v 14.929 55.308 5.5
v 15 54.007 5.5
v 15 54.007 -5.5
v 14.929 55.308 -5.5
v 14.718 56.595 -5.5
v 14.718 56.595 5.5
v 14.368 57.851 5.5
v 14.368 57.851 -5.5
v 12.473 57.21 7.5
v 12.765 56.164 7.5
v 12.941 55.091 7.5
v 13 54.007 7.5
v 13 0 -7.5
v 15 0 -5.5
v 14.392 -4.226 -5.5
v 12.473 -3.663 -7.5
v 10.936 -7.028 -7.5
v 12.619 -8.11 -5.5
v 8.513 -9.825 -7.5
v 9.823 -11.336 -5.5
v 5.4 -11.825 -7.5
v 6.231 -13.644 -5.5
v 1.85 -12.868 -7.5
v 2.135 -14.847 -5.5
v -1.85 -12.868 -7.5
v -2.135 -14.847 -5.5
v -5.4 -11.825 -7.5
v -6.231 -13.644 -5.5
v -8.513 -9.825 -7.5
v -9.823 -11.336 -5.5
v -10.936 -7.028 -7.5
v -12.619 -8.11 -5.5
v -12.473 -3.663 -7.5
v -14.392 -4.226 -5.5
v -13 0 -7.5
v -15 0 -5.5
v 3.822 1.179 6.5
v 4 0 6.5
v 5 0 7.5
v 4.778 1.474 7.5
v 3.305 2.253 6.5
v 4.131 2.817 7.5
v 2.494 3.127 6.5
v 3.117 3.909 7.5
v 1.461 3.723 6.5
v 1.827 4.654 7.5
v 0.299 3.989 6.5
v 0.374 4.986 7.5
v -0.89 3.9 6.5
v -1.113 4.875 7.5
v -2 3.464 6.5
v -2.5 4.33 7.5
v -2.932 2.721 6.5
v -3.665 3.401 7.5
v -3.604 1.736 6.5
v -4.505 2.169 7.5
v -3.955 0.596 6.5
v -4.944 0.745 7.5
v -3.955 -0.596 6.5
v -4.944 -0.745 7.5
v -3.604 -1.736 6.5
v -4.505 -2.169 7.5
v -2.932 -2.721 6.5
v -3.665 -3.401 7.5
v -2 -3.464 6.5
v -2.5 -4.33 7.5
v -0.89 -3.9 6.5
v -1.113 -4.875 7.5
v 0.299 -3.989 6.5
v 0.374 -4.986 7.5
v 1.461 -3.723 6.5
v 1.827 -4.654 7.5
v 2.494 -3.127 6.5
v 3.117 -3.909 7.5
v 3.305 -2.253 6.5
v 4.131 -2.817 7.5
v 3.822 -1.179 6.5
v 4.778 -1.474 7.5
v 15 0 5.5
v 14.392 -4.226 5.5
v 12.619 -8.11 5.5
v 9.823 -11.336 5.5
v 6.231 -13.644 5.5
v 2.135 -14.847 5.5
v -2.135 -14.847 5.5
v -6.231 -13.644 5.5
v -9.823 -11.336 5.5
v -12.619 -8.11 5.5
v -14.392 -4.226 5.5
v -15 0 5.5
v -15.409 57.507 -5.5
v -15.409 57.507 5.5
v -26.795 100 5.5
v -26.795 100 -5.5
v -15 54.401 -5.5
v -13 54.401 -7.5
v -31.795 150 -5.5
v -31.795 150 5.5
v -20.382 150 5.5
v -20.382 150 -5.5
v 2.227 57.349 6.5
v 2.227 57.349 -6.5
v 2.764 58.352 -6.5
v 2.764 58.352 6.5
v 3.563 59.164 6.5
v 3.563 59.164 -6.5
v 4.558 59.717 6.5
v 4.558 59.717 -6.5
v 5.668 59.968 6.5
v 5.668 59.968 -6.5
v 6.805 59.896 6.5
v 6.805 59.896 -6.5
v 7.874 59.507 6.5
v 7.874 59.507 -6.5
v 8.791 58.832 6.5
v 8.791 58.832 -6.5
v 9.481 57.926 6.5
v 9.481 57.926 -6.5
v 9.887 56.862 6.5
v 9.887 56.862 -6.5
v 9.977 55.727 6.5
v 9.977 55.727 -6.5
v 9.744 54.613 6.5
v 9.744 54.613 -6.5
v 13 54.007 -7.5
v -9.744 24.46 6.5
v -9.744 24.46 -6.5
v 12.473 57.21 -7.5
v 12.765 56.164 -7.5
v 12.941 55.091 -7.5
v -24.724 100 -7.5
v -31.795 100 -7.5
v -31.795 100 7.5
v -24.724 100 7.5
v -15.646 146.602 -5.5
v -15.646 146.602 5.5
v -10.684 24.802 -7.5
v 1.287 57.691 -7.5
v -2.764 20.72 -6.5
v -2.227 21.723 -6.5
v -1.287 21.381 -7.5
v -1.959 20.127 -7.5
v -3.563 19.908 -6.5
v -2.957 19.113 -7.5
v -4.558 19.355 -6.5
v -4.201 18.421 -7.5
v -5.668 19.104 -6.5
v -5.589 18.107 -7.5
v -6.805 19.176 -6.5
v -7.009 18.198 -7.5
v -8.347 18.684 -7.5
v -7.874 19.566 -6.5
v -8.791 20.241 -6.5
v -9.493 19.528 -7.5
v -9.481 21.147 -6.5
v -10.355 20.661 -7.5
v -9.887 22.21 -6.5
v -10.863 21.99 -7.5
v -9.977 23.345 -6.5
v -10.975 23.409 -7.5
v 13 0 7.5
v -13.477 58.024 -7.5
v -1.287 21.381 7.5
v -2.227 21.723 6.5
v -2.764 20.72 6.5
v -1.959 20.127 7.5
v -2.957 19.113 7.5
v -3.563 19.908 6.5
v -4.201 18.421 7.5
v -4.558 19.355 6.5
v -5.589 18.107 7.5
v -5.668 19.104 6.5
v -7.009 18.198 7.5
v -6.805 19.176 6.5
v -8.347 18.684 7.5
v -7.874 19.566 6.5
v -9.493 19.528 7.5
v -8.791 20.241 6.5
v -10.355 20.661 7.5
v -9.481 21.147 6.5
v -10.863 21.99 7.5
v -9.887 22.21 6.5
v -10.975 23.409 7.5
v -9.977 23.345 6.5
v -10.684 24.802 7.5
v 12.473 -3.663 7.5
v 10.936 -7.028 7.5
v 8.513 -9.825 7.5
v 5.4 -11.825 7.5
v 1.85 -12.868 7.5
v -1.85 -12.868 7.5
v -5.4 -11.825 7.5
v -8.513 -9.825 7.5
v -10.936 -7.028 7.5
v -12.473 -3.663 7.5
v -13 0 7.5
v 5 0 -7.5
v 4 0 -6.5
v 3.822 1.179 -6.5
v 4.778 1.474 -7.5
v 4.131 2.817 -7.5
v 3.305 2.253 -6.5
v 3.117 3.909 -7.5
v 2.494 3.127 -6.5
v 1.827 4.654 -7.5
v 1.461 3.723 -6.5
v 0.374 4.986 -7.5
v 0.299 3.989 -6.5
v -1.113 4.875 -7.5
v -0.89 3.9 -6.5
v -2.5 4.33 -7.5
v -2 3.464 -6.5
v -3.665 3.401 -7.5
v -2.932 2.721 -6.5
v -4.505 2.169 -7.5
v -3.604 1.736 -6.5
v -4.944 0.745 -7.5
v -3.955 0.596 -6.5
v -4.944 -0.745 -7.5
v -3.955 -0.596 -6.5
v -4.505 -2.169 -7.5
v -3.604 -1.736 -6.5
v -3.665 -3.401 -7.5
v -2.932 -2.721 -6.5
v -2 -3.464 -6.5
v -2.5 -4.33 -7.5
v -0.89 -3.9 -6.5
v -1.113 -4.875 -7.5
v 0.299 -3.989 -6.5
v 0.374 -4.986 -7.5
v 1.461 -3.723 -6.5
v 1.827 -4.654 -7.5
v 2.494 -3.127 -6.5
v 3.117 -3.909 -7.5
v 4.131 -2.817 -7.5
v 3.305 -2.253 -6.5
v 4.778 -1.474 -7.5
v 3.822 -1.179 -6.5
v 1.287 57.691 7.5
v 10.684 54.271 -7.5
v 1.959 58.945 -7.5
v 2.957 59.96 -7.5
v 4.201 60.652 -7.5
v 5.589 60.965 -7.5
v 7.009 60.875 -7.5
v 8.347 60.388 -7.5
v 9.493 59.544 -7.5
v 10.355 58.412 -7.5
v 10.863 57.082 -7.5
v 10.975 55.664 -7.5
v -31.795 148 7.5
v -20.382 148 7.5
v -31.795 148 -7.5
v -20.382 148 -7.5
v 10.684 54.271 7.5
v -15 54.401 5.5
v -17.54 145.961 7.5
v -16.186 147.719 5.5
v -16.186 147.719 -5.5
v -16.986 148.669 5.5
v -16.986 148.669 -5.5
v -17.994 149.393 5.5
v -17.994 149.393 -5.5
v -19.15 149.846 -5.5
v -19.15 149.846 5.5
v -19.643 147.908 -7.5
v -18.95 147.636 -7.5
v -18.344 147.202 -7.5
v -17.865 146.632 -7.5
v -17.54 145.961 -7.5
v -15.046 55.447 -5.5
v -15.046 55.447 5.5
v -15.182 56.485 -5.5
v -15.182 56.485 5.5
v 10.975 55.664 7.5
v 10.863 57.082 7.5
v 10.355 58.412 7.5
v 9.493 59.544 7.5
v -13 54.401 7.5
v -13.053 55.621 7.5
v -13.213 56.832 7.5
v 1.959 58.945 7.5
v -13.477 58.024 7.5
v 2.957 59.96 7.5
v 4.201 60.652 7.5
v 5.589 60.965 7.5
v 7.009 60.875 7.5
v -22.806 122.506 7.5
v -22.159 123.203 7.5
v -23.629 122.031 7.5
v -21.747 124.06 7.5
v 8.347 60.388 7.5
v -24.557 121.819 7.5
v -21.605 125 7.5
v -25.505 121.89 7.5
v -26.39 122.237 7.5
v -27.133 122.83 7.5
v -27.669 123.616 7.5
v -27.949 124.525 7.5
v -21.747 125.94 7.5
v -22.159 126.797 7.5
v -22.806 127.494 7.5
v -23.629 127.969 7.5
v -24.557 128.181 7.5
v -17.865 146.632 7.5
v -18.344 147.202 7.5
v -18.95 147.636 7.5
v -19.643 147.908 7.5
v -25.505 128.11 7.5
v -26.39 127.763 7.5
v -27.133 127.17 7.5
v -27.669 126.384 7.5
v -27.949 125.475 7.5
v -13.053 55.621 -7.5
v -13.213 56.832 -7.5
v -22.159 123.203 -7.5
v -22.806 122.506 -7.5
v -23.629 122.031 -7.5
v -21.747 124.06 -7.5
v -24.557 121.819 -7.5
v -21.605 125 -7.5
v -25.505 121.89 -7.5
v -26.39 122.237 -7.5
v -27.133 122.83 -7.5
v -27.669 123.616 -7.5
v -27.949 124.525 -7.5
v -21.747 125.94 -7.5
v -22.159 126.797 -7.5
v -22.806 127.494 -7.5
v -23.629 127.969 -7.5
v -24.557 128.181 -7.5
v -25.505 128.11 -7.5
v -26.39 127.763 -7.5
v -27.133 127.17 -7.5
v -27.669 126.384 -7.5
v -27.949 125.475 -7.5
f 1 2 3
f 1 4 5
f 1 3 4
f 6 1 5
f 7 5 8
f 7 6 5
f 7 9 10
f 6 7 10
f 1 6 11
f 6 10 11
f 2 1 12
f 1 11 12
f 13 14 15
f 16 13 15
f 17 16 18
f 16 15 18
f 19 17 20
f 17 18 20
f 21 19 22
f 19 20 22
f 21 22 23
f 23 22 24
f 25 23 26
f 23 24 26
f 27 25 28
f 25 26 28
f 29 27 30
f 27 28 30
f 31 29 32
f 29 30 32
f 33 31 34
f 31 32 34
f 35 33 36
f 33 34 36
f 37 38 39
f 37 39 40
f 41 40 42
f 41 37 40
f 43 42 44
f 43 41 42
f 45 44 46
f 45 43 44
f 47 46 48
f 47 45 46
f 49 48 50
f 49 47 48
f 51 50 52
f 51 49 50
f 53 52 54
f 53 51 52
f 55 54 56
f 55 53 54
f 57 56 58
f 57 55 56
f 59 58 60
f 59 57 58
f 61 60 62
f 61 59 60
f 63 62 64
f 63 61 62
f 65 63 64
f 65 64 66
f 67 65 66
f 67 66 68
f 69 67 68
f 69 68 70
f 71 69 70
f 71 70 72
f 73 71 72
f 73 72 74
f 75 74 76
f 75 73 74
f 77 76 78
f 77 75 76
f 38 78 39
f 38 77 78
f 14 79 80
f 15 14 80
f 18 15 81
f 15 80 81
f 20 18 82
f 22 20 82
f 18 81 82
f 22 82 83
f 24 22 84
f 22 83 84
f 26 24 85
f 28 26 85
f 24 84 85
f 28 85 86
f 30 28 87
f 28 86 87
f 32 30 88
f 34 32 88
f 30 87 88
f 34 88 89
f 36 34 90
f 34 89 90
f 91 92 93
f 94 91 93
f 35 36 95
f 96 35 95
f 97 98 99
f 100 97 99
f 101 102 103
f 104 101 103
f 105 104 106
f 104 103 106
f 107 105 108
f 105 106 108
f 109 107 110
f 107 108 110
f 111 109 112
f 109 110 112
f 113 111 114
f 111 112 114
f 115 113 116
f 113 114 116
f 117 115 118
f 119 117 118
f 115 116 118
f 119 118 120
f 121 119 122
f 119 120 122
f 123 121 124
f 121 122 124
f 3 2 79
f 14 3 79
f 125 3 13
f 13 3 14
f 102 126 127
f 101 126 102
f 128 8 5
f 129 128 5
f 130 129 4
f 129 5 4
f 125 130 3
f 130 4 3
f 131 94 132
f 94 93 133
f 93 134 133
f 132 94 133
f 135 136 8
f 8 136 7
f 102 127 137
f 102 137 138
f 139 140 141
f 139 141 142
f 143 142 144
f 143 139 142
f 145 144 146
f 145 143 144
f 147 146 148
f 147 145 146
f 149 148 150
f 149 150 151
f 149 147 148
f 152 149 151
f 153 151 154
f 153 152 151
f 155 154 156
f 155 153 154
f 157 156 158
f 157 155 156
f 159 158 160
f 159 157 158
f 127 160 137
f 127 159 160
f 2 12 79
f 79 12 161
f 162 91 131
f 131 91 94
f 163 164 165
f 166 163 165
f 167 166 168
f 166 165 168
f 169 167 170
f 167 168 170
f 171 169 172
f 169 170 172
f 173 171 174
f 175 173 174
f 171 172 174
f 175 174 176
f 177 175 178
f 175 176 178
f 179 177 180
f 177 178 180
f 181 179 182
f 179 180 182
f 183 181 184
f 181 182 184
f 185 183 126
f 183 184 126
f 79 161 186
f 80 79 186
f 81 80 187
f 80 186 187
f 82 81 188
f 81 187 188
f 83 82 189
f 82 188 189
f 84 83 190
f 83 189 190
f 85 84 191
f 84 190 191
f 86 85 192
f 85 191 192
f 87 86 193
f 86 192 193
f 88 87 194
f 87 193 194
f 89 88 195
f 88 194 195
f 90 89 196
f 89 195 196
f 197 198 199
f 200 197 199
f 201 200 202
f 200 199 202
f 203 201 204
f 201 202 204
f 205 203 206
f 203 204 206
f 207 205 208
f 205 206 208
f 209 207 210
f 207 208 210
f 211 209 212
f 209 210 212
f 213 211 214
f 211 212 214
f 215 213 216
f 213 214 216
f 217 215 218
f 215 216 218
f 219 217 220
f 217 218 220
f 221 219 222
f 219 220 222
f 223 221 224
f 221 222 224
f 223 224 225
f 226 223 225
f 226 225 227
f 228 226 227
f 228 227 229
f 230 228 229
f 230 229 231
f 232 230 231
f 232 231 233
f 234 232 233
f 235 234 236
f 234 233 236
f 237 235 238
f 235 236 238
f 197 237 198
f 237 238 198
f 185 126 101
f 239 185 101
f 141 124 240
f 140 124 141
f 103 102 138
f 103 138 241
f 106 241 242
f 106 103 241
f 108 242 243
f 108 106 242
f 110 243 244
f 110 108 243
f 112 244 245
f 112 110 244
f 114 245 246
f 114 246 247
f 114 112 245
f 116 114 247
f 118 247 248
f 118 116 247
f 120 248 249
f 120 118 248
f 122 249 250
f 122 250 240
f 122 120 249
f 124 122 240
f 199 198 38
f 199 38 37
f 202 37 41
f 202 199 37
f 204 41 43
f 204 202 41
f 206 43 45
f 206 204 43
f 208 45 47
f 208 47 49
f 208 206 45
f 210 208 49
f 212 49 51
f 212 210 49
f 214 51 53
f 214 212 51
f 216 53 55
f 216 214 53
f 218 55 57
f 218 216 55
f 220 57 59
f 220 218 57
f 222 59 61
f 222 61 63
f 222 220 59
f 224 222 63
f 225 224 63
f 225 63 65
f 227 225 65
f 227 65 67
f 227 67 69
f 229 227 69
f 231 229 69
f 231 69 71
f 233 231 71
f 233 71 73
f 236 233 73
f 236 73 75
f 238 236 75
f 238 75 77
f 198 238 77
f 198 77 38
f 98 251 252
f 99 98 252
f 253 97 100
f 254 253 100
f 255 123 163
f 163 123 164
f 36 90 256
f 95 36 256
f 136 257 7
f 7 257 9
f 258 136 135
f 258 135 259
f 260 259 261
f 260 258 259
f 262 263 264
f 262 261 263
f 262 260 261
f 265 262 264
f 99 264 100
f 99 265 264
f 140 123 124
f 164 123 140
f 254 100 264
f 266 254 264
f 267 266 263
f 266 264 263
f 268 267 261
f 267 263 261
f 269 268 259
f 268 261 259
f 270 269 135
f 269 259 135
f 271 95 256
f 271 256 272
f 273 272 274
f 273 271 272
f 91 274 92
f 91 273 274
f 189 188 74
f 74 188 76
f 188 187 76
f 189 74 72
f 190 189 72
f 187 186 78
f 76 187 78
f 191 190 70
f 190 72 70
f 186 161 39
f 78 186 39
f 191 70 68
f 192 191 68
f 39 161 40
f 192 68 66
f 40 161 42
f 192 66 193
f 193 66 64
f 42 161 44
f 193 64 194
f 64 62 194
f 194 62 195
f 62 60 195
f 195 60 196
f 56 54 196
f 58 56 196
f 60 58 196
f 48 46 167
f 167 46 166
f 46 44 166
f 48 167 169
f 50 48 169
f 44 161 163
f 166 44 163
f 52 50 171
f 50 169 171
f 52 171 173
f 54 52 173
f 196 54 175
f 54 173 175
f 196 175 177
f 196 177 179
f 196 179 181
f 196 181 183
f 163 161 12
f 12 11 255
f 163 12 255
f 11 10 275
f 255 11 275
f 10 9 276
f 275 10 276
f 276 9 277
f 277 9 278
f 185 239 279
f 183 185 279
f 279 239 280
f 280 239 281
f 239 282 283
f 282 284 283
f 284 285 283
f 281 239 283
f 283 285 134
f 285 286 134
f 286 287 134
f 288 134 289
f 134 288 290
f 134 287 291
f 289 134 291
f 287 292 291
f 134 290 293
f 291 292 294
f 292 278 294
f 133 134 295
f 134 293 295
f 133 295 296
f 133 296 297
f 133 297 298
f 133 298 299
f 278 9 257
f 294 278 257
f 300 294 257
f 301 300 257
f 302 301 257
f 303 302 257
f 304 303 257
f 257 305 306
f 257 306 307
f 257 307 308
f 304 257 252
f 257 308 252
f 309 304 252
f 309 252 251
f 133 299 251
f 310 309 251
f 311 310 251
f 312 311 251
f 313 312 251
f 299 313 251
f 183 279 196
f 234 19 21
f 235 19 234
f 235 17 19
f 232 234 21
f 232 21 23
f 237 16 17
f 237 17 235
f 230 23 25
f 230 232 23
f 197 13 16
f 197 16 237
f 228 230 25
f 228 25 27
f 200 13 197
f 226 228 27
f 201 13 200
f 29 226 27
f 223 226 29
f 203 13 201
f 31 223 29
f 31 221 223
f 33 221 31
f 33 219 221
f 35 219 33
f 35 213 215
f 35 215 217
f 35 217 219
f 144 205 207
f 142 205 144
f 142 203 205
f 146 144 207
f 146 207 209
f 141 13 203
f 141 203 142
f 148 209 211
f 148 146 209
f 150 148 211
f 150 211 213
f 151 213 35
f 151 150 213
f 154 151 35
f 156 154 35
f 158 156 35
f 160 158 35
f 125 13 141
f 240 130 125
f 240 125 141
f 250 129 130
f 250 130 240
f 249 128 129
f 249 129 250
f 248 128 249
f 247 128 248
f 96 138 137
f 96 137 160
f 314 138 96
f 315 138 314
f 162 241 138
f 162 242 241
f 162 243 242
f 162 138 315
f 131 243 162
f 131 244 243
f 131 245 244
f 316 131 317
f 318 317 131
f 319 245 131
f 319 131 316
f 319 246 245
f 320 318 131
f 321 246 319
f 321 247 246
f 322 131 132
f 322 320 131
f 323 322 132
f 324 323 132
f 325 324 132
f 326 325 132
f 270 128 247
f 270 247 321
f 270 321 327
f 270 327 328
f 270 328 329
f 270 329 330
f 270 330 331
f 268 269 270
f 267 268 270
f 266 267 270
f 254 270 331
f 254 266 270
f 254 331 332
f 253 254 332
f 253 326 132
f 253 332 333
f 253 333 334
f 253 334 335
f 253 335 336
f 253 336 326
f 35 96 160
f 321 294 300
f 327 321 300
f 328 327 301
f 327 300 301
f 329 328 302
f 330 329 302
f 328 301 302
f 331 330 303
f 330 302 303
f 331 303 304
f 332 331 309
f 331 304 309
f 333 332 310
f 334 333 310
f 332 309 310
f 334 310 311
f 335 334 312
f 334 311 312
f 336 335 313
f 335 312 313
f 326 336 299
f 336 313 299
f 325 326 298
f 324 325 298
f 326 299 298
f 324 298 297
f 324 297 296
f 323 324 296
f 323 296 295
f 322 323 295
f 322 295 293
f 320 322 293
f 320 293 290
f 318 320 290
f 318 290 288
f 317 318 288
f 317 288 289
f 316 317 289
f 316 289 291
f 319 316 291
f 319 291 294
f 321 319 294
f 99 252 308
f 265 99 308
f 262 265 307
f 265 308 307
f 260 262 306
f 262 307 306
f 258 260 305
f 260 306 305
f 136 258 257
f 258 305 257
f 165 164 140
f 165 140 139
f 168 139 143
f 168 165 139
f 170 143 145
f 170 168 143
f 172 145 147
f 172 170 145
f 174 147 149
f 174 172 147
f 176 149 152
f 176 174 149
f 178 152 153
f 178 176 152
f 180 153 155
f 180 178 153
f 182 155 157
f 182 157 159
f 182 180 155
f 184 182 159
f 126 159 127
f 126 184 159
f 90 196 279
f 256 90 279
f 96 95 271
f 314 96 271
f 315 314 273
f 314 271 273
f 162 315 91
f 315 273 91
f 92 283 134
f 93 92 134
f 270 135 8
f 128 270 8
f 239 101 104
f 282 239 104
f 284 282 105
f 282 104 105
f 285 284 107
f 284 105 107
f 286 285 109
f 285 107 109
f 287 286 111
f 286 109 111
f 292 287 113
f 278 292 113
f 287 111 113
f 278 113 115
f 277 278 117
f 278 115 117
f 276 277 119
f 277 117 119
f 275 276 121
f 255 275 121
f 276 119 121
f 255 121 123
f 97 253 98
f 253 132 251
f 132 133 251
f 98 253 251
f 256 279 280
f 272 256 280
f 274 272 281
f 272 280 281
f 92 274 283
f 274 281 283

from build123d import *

# Parameters (mm, degrees)
CROQUIS1_R              = 4
SALIENTE_EXTRUIR1_DEPTH = 7.5
CROQUIS2_R              = 3.19
CORTAR_EXTRUIR1_DEPTH   = 155.064651655
REDONDEO1_R             = 12
CHAFL_N1_SIZE           = 1
REDONDEO2_R             = 5
CHAFL_N2_SIZE           = 2
CHAFL_N3_SIZE           = 1


with BuildPart() as part:
    # Croquis1 → Saliente-Extruir1 (new, symmetric)
    with BuildSketch(Plane.XY):
        with BuildLine():
            Line((-15, 0), (-15, 55.980762114))
            Line((-15, 55.980762114), (-26.794919243, 100))
            Line((-26.794919243, 100), (-31.794919243, 100))
            Line((-31.794919243, 100), (-31.794919243, 150))
            Line((-31.794919243, 150), (-16.794919243, 150))
            Line((-16.794919243, 150), (15, 55.980762114))
            Line((15, 55.980762114), (15, 0))
            ThreePointArc((15, 0), (0, -15), (-15, 0))
        make_face()
        Circle(CROQUIS1_R, mode=Mode.SUBTRACT)
        with BuildLine():
            Line((9.744122991, 54.61268154), (-2.226582025, 21.723439813))
            ThreePointArc((-2.226582025, 21.723439813), (-7.353433082, 19.332749903), (-9.744122991, 24.459600959))
            Line((-9.744122991, 24.459600959), (2.226582025, 57.348842687))
            ThreePointArc((2.226582025, 57.348842687), (7.353433082, 59.739532597), (9.744122991, 54.61268154))
        make_face(mode=Mode.SUBTRACT)
    extrude(amount=SALIENTE_EXTRUIR1_DEPTH, both=True)

    # Croquis2 → Cortar-Extruir1 (cut, through all)
    with BuildSketch(Plane.XY.offset(7.5)):
        with Locations((-24.794919243, 125)):
            Circle(CROQUIS2_R)
    extrude(amount=-CORTAR_EXTRUIR1_DEPTH, mode=Mode.SUBTRACT)

    # Redondeo1
    redondeo1_edges = [part.edges().sort_by_distance(p)[0] for p in [
        (-15, 55.980762114, 0),
        (15, 55.980762114, 0),
    ]]
    fillet(redondeo1_edges, radius=REDONDEO1_R)

    # Chaflán1
    chafl_n1_edges = [part.edges().sort_by_distance(p)[0] for p in [
        (-4, 0, -7.5),
        (-4, 0, 7.5),
    ]]
    chamfer(chafl_n1_edges, length=CHAFL_N1_SIZE)

    # Redondeo2
    redondeo2_edges = [part.edges().sort_by_distance(p)[0] for p in [
        (-16.794919243, 150, 0),
    ]]
    fillet(redondeo2_edges, radius=REDONDEO2_R)

    # Chaflán2
    chafl_n2_edges = [part.edges().sort_by_distance(p)[0] for p in [
        (15, 27.00331421, -7.5),
        (0, -15, -7.5),
        (-21.101904664, 78.753380342, 7.5),
        (0, -15, 7.5),
        (-15, 27.200466071, -7.5),
        (-15, 27.200466071, 7.5),
        (-0.639069755, 102.226308716, -7.5),
        (-0.639069755, 102.226308716, 7.5),
        (14.840839938, 55.95457851, -7.5),
        (14.840839938, 55.95457851, 7.5),
        (-15.102661664, 55.967246449, -7.5),
        (-15.102661664, 55.967246449, 7.5),
        (-26.088566443, 150, -7.5),
        (-26.088566443, 150, 7.5),
        (-17.467493018, 149.062561222, -7.5),
        (-17.467493018, 149.062561222, 7.5),
        (15, 27.00331421, 7.5),
        (-21.101904664, 78.753380342, -7.5),
    ]]
    chamfer(chafl_n2_edges, length=CHAFL_N2_SIZE)

    # Chaflán3
    chafl_n3_edges = [part.edges().sort_by_distance(p)[0] for p in [
        (7.353433082, 59.739532597, -7.5),
        (-3.758770483, 40.904221823, -7.5),
        (-7.353433082, 19.332749903, -7.5),
        (3.758770483, 38.168060676, -7.5),
        (7.353433082, 59.739532597, 7.5),
        (-3.758770483, 40.904221823, 7.5),
        (-7.353433082, 19.332749903, 7.5),
        (3.758770483, 38.168060676, 7.5),
    ]]
    chamfer(chafl_n3_edges, length=CHAFL_N3_SIZE)


solid = part.part
